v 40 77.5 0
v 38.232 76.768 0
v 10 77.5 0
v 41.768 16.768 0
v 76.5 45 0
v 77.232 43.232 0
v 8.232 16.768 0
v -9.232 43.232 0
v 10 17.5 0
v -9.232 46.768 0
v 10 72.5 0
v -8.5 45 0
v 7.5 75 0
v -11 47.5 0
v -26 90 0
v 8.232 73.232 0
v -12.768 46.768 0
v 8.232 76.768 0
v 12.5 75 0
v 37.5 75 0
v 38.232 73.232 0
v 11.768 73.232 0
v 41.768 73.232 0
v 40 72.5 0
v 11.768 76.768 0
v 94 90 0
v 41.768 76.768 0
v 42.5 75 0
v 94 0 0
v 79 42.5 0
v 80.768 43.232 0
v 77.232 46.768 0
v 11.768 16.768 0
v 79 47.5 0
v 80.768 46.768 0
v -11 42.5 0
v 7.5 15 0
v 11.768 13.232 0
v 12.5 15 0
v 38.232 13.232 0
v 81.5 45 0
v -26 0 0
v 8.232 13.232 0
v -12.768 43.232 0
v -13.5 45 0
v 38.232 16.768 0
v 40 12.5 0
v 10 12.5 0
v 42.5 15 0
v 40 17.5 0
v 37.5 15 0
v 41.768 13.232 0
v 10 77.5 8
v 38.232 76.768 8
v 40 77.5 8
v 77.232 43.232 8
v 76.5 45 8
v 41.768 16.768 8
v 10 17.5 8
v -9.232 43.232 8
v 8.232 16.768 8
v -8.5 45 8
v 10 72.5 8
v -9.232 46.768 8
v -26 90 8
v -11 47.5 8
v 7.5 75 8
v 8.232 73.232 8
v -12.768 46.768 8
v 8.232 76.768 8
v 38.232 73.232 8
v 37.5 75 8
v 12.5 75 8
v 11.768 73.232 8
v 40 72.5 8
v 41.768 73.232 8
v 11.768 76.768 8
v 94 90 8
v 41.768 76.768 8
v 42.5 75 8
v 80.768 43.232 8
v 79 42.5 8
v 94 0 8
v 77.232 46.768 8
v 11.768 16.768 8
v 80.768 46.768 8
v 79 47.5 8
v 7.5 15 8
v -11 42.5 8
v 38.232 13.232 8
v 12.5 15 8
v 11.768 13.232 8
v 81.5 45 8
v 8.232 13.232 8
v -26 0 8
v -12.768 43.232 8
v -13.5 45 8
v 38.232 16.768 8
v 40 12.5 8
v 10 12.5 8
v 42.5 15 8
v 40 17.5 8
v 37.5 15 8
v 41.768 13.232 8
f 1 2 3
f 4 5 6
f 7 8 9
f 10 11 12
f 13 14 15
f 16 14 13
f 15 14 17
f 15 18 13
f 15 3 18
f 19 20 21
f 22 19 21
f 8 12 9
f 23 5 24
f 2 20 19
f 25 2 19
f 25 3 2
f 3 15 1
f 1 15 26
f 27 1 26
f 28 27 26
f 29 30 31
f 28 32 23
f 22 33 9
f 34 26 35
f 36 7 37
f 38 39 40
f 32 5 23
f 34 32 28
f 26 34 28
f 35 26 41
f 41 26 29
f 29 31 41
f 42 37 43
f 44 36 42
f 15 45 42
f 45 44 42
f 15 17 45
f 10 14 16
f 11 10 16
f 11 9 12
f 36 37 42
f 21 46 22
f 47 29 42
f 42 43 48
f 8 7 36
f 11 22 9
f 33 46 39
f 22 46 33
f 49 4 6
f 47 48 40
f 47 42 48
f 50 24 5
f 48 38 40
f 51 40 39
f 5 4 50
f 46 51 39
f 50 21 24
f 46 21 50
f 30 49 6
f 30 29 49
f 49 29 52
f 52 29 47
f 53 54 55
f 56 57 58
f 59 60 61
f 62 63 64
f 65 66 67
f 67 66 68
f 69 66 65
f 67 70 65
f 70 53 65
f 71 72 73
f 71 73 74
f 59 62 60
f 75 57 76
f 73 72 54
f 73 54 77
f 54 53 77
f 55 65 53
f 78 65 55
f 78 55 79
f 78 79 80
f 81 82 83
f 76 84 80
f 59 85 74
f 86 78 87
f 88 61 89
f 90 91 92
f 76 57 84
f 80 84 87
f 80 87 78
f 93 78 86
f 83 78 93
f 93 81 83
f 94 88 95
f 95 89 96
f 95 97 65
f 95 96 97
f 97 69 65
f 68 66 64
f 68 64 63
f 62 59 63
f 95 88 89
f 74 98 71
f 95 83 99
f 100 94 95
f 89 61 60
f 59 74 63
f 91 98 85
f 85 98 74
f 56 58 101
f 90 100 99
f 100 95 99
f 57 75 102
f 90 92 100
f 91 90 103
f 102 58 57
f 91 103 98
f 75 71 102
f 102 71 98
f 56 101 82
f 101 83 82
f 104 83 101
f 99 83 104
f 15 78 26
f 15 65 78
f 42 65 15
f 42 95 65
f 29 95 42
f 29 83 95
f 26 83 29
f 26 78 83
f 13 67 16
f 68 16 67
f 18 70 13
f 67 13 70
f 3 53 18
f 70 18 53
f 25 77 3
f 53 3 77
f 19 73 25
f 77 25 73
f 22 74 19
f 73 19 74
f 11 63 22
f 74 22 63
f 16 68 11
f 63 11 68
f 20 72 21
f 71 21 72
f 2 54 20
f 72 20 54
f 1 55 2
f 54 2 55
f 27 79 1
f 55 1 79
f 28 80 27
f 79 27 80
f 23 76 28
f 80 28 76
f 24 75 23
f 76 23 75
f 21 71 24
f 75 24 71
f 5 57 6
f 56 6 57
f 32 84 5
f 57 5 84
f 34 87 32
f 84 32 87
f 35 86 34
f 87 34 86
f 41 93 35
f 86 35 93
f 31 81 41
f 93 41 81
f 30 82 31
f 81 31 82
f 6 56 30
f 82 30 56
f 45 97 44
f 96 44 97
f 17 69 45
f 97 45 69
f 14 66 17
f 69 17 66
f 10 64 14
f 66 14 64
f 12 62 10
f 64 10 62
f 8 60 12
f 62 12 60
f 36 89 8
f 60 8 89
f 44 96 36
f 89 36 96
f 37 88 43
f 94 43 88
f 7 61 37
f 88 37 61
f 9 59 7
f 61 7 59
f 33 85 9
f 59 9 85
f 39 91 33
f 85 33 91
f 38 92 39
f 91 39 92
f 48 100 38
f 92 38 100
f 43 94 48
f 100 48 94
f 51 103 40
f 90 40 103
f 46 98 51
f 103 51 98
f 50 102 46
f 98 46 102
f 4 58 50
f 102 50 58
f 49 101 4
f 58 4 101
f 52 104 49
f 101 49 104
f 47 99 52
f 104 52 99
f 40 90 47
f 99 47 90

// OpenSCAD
// file: ../../lib/torche_adapter.scad
module torche_adapter_base(thickness, width=90, length=120) {
    nut_width = 80;
    y_offset = (width - nut_width)/2;
    x_offset = 26;
	color([0, 0.5, 0.8, 0.5]) {
        difference() {
            linear_extrude(thickness) {
                difference() {
                    polygon(points=[[-x_offset, 0],
                                    [-x_offset, 90],
                                    [length-x_offset, 90],
                                    [length-x_offset, 0]]);
                    translate([10, y_offset + 10]) circle(d=5);
                    translate([40, y_offset + 10]) circle(d=5);
                    translate([10, y_offset + 70]) circle(d=5);
                    translate([40, y_offset + 70]) circle(d=5);
                    // translate([15, y_offset +  5]) circle(d=5);
                    // translate([35, y_offset +  5]) circle(d=5);
                    // translate([15, y_offset + 75]) circle(d=5);
                    // translate([35, y_offset + 75]) circle(d=5);
                    translate([length - x_offset - 15, width/2]) circle(d=5);
                    translate([- x_offset + 15, width/2]) circle(d=5);
                }
            }
        }
    }

}


module torche_adapter() {
    rotate([0, 90, 0]) torche_adapter_base(8, 90, 120);
}
// main file
include <../../lib/torche_adapter.scad>

rotate([0, -90, 0]) torche_adapter();
